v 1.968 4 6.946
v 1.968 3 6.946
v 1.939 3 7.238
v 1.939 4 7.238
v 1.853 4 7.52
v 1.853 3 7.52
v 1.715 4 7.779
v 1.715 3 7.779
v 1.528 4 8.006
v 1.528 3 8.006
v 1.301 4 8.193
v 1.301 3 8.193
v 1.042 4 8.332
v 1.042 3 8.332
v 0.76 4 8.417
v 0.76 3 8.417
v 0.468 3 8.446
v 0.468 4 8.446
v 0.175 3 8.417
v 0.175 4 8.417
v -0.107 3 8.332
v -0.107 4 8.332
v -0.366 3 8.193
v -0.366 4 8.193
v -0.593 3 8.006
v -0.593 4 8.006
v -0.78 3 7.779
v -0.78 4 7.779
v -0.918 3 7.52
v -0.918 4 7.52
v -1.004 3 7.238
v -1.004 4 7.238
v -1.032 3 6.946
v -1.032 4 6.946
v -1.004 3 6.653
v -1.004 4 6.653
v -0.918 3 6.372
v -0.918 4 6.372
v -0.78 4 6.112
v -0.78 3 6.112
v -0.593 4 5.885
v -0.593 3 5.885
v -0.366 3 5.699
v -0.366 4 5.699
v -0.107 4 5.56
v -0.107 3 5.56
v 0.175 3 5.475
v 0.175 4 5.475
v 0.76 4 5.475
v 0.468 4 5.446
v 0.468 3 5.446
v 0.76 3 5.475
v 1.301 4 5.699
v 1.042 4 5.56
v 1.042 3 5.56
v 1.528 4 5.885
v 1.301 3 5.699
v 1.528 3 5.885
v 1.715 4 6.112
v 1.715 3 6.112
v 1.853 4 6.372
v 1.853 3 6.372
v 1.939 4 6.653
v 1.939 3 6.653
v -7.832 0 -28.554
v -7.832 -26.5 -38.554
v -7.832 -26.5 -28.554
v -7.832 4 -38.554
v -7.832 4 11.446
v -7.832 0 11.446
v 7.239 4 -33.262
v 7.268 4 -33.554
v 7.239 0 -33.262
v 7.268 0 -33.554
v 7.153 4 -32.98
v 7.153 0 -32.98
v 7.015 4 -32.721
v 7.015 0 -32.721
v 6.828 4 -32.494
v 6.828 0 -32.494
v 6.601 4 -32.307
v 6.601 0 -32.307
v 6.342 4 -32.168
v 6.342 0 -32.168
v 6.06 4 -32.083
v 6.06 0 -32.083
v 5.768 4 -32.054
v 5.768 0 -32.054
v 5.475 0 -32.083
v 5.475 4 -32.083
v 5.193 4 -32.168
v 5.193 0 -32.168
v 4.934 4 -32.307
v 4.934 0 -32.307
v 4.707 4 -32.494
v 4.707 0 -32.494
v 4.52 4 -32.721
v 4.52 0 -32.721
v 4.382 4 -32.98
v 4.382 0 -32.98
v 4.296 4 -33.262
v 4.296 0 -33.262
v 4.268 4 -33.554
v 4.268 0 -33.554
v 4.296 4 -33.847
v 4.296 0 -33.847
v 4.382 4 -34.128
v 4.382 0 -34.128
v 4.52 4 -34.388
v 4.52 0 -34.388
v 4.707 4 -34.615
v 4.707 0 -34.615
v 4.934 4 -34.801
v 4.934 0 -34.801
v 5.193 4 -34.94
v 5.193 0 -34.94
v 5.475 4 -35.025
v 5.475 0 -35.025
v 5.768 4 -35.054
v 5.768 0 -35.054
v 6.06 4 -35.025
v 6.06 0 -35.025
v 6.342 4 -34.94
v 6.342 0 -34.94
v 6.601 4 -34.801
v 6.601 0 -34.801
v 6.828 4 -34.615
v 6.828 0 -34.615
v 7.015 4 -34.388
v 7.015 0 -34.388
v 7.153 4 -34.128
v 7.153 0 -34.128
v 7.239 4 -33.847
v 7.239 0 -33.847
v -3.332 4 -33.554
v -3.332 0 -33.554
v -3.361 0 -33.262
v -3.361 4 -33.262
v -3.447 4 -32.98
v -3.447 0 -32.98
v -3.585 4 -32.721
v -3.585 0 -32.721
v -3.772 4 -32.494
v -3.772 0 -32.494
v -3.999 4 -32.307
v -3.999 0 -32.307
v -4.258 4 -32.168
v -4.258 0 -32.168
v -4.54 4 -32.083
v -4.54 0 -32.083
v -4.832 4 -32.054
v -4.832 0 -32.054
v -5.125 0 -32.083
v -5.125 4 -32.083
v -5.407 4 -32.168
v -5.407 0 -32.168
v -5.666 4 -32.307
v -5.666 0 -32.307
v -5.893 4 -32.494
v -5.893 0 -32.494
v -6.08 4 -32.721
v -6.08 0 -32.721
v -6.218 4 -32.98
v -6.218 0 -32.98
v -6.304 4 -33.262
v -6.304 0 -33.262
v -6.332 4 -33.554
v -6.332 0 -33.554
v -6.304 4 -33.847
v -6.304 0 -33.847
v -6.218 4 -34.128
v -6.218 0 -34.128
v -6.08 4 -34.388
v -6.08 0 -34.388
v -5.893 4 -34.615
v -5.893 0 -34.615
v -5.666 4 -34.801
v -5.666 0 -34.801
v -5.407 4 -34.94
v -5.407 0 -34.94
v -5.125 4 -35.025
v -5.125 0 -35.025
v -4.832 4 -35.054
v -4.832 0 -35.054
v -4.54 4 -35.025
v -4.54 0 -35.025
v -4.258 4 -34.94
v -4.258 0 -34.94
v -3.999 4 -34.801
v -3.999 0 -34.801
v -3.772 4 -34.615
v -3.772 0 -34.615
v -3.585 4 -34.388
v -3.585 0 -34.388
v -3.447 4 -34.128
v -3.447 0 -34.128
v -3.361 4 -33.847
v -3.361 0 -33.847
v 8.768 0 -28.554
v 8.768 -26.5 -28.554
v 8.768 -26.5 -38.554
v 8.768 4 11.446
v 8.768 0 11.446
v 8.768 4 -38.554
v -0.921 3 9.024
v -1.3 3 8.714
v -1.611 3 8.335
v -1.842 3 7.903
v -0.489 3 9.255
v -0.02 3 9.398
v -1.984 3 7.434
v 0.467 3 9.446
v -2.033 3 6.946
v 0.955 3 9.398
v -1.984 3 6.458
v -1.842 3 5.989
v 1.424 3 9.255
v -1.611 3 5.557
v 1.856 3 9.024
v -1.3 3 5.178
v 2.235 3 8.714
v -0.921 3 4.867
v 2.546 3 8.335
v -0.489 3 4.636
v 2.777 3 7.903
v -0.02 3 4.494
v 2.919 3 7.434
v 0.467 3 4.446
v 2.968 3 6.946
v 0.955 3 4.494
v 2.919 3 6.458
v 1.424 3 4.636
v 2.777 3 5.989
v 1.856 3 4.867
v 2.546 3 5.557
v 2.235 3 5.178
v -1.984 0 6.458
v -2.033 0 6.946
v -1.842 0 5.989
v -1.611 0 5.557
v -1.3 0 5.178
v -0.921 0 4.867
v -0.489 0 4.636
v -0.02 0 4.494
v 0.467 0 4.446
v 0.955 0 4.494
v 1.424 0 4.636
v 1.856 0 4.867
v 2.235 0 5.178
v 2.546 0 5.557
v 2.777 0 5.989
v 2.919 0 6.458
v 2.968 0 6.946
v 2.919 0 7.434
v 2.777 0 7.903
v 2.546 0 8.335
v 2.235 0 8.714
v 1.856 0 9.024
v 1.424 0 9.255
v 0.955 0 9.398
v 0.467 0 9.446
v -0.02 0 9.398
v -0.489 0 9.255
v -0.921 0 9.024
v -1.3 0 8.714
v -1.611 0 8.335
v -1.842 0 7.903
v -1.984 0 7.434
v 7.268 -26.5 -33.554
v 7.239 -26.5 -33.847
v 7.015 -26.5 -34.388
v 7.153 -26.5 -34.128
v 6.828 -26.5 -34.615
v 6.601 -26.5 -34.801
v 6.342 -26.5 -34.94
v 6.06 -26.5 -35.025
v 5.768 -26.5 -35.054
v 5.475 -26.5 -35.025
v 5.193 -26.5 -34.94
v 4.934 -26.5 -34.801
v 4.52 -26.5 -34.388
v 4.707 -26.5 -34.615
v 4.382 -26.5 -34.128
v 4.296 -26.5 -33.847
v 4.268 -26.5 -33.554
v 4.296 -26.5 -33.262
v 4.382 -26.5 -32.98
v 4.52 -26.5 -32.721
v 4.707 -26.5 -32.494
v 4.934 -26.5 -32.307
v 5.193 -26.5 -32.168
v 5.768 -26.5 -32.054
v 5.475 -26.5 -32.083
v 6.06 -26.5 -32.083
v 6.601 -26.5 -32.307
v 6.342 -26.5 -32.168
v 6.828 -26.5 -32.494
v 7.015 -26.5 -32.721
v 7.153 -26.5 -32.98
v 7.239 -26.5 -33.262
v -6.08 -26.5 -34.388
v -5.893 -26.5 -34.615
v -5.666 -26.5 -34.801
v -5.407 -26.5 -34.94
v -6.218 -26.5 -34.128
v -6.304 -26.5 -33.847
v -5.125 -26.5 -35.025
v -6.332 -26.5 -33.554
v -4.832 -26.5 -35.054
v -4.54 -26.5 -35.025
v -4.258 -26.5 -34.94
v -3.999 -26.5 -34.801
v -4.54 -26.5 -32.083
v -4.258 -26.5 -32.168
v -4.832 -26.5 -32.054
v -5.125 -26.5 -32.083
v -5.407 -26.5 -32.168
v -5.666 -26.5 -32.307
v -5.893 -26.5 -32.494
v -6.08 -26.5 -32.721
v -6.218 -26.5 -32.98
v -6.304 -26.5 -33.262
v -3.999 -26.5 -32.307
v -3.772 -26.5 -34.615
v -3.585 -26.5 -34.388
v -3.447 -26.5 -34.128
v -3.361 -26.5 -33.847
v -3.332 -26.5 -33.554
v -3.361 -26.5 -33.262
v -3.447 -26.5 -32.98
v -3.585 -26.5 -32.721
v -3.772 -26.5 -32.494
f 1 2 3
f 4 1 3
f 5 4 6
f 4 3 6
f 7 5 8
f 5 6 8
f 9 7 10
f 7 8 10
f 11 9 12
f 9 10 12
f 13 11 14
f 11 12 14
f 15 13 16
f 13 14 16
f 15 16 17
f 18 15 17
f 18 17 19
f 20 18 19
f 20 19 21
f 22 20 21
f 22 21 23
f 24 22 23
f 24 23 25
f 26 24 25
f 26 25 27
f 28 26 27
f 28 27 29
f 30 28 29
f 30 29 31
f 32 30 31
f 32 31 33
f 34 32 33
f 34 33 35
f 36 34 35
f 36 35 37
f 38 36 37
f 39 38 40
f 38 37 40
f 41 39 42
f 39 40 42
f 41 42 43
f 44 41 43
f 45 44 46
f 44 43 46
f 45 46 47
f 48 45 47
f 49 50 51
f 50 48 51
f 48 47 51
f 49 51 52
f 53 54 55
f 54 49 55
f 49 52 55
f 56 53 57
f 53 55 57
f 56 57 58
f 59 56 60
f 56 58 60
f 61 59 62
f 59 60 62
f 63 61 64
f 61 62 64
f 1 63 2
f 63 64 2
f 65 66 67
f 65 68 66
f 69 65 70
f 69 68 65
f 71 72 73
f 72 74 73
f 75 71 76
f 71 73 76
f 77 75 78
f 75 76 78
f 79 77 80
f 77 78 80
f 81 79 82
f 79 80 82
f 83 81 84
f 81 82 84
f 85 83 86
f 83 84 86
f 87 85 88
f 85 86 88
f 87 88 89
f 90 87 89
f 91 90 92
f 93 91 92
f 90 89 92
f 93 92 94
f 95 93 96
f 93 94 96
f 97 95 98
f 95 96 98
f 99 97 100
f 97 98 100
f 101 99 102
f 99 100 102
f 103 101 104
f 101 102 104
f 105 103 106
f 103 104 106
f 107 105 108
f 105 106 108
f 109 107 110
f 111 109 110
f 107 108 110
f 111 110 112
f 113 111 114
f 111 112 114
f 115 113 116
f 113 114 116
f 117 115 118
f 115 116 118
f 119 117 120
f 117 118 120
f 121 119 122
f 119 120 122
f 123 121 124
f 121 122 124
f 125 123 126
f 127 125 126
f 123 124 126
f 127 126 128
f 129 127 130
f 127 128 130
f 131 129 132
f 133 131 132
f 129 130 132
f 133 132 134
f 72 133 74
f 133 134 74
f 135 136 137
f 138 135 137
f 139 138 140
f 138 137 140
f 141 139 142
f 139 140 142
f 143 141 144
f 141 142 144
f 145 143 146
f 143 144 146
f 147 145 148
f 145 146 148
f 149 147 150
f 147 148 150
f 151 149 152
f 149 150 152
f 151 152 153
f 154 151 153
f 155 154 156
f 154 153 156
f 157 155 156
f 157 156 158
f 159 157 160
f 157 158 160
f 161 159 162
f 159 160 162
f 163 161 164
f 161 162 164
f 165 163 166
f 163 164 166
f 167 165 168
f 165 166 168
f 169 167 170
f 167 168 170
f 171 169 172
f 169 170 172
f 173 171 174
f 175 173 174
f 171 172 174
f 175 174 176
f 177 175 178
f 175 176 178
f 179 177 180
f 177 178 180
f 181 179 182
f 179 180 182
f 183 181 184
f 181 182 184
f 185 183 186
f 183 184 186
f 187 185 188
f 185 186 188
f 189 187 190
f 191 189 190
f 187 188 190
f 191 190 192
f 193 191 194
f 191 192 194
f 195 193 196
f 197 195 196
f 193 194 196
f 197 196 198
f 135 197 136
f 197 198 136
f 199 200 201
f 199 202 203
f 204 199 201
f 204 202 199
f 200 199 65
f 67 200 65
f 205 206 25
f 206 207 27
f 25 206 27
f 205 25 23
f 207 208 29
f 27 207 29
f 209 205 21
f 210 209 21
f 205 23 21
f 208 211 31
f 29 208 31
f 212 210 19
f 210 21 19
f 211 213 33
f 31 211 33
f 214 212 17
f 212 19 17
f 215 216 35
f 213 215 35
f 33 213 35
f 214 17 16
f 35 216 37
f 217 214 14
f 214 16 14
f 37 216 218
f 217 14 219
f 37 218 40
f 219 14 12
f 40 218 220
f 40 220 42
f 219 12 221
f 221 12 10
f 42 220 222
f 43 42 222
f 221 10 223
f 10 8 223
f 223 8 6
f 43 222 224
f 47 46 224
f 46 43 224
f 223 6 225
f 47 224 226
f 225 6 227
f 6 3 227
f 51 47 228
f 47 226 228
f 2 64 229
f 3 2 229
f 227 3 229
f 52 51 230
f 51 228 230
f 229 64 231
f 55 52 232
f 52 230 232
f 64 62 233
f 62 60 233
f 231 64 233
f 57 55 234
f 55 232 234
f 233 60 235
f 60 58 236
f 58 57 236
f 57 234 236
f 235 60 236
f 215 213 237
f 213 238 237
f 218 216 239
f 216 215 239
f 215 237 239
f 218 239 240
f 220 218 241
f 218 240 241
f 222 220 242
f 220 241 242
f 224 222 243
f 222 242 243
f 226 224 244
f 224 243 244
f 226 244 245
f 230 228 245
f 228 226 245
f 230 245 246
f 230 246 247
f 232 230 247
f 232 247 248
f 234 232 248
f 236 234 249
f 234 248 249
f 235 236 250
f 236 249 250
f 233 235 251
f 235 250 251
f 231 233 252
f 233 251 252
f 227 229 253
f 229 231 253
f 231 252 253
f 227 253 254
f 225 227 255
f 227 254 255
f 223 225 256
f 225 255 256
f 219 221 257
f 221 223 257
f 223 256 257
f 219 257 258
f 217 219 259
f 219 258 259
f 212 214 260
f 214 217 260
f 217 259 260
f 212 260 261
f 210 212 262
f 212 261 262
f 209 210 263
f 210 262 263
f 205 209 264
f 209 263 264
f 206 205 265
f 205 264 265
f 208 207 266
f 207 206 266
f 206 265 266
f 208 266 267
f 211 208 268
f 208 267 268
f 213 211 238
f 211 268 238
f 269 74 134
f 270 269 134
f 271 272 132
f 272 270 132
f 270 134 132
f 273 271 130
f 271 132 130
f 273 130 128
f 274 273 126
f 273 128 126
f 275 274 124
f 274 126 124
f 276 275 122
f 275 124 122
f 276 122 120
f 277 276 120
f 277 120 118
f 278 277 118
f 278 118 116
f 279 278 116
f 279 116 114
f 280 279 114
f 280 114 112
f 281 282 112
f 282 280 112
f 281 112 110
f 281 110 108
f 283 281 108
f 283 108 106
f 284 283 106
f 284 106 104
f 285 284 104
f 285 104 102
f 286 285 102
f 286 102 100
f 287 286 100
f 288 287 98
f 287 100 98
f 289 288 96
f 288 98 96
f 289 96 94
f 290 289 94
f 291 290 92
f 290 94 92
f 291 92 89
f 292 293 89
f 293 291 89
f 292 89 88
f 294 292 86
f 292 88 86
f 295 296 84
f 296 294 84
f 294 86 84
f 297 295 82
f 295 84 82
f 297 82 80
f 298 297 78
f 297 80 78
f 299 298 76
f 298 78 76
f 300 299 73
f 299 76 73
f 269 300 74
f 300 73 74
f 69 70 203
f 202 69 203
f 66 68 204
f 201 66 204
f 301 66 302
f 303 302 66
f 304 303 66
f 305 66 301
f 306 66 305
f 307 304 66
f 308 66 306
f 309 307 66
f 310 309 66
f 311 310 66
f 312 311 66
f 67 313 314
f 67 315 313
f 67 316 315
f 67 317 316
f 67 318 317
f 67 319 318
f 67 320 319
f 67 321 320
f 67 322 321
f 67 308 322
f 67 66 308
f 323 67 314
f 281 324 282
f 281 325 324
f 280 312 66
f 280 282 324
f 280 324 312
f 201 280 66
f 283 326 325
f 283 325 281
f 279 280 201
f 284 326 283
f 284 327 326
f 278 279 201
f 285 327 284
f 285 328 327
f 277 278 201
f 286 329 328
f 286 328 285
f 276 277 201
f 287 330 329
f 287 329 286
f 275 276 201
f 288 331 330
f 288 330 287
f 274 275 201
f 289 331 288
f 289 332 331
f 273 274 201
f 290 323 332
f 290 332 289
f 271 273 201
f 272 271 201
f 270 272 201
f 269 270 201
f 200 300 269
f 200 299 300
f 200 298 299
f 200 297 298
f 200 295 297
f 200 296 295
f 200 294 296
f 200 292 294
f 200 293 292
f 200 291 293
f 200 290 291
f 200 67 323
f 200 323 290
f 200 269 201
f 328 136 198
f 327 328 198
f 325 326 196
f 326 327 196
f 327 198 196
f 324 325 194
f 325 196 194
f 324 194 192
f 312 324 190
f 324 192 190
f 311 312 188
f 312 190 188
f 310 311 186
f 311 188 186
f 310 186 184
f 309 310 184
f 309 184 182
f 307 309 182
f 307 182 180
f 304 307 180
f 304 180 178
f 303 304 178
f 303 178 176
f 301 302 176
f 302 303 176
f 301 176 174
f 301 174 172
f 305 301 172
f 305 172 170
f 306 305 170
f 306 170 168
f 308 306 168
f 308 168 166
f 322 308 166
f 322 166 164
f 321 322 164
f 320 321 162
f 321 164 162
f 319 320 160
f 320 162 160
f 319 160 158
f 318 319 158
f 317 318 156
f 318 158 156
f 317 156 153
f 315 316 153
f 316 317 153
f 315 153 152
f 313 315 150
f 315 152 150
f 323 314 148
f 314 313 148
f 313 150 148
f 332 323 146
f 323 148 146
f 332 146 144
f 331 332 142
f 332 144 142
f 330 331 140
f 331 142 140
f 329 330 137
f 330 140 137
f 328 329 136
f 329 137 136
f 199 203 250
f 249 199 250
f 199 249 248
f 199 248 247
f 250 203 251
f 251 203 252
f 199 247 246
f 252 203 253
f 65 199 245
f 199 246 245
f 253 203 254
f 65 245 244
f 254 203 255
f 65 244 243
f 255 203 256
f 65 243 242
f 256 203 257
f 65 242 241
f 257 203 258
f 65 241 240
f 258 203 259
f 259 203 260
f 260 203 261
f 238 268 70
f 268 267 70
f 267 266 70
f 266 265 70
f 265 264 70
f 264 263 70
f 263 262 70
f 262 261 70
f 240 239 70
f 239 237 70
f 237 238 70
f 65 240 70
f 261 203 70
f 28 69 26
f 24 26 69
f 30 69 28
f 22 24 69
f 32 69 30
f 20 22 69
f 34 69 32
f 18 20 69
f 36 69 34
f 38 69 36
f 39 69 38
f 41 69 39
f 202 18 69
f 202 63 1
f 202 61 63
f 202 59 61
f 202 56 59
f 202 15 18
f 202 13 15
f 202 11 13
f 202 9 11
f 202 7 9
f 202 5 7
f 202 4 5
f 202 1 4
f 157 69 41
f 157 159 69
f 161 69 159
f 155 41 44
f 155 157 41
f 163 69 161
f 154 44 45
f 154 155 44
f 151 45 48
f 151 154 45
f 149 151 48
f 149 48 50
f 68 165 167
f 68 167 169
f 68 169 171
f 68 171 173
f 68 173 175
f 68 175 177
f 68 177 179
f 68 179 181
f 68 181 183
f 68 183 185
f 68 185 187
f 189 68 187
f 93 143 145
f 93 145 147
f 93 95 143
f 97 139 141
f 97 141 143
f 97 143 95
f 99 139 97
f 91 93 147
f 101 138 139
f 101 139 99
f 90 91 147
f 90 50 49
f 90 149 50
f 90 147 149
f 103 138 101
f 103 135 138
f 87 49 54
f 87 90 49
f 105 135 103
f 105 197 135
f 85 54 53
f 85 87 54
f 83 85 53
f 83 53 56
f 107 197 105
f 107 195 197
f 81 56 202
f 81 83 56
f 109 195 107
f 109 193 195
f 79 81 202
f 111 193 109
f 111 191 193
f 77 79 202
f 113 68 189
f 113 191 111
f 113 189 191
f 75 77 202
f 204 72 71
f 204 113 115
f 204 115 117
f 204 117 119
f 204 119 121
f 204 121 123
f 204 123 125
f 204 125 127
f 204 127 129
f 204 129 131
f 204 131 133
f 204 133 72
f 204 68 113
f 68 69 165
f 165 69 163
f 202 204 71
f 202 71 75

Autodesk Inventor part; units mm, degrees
ref_plane "YZ Plane" through (0, 0, 0) normal (1, 0, 0) x (0, 1, 0)
ref_plane "XZ Plane" through (0, 0, 0) normal (0, 1, 0) x (-1, 0, 0)
ref_plane "XY Plane" through (0, 0, 0) normal (0, 0, 1) x (1, 0, 0)
sketch "スケッチ1" plane through (0, 0, 0) normal (0, 1, 0) x (-1, 0, 0)
  line L0 (7.8325, 11.4458) -> (-8.7675, 11.4458)
  line L1 (-8.7675, 11.4458) -> (-8.7675, -38.5542)
  line L2 (-8.7675, -38.5542) -> (7.8325, -38.5542)
  line L3 (7.8325, -38.5542) -> (7.8325, 11.4458)
  circle A0 centre (-0.4675, 6.9458) radius 2.5
  point P0 (0, 0)
  dimension "d0" = 16.6
  dimension "d1" = 5
  dimension "d2" = 8.3
  dimension "d3" = 8.3
  dimension "d4" = 4.5
  dimension "d5" = 2
  dimension "d6" = 50
extrude "押し出し1" add sketch "スケッチ1" along normal blind 3
sketch "スケッチ2" plane through (0, 3, 0) normal (0, 1, 0) x (1, 0, 0)
  line L0 (-7.8325, 38.5542) -> (-7.8325, -11.4458) projected
  line L1 (8.7675, -11.4458) -> (8.7675, 38.5542) projected
  line L2 (-7.8325, -11.4458) -> (8.7675, -11.4458)
  line L3 (8.7675, -11.4458) -> (8.7675, 38.5542)
  line L4 (8.7675, 38.5542) -> (-7.8325, 38.5542)
  line L5 (-7.8325, 38.5542) -> (-7.8325, -11.4458)
  circle A0 centre (0.4675, -6.9458) radius 1.5
  circle A1 centre (0.4675, -6.9458) radius 2.5 projected
  point P0 (0, 0)
  dimension "d9" = 3
extrude "押し出し2" add sketch "スケッチ2" along normal blind 1 contours L4 L1 L2 L0 | A1
sketch "スケッチ3" plane through (0, 0, 0) normal (0, -1, 0) x (1, 0, 0)
  line L0 (-7.8325, -38.5542) -> (-7.8325, 11.4458) projected
  line L1 (8.7675, 11.4458) -> (8.7675, -38.5542) projected
  line L2 (-7.8325, -38.5542) -> (8.7675, -38.5542)
  line L3 (8.7675, -38.5542) -> (8.7675, -28.5542)
  line L4 (8.7675, -28.5542) -> (-7.8325, -28.5542)
  line L5 (-7.8325, -28.5542) -> (-7.8325, -38.5542)
  circle A0 centre (5.7675, -33.5542) radius 1.5
  circle A1 centre (-4.8325, -33.5542) radius 1.5
  point P0 (0, 0)
  dimension "d12" = 10
  dimension "d13" = 5
  dimension "d14" = 5
  dimension "d15" = 3
  dimension "d16" = 3
  dimension "d17" = 3
  dimension "d18" = 3
extrude "押し出し3" add sketch "スケッチ3" along normal blind 26.5
extrude "押し出し4" cut sketch "スケッチ3" against normal blind 21 contours A0 | A1
properties part number "armpart1"
